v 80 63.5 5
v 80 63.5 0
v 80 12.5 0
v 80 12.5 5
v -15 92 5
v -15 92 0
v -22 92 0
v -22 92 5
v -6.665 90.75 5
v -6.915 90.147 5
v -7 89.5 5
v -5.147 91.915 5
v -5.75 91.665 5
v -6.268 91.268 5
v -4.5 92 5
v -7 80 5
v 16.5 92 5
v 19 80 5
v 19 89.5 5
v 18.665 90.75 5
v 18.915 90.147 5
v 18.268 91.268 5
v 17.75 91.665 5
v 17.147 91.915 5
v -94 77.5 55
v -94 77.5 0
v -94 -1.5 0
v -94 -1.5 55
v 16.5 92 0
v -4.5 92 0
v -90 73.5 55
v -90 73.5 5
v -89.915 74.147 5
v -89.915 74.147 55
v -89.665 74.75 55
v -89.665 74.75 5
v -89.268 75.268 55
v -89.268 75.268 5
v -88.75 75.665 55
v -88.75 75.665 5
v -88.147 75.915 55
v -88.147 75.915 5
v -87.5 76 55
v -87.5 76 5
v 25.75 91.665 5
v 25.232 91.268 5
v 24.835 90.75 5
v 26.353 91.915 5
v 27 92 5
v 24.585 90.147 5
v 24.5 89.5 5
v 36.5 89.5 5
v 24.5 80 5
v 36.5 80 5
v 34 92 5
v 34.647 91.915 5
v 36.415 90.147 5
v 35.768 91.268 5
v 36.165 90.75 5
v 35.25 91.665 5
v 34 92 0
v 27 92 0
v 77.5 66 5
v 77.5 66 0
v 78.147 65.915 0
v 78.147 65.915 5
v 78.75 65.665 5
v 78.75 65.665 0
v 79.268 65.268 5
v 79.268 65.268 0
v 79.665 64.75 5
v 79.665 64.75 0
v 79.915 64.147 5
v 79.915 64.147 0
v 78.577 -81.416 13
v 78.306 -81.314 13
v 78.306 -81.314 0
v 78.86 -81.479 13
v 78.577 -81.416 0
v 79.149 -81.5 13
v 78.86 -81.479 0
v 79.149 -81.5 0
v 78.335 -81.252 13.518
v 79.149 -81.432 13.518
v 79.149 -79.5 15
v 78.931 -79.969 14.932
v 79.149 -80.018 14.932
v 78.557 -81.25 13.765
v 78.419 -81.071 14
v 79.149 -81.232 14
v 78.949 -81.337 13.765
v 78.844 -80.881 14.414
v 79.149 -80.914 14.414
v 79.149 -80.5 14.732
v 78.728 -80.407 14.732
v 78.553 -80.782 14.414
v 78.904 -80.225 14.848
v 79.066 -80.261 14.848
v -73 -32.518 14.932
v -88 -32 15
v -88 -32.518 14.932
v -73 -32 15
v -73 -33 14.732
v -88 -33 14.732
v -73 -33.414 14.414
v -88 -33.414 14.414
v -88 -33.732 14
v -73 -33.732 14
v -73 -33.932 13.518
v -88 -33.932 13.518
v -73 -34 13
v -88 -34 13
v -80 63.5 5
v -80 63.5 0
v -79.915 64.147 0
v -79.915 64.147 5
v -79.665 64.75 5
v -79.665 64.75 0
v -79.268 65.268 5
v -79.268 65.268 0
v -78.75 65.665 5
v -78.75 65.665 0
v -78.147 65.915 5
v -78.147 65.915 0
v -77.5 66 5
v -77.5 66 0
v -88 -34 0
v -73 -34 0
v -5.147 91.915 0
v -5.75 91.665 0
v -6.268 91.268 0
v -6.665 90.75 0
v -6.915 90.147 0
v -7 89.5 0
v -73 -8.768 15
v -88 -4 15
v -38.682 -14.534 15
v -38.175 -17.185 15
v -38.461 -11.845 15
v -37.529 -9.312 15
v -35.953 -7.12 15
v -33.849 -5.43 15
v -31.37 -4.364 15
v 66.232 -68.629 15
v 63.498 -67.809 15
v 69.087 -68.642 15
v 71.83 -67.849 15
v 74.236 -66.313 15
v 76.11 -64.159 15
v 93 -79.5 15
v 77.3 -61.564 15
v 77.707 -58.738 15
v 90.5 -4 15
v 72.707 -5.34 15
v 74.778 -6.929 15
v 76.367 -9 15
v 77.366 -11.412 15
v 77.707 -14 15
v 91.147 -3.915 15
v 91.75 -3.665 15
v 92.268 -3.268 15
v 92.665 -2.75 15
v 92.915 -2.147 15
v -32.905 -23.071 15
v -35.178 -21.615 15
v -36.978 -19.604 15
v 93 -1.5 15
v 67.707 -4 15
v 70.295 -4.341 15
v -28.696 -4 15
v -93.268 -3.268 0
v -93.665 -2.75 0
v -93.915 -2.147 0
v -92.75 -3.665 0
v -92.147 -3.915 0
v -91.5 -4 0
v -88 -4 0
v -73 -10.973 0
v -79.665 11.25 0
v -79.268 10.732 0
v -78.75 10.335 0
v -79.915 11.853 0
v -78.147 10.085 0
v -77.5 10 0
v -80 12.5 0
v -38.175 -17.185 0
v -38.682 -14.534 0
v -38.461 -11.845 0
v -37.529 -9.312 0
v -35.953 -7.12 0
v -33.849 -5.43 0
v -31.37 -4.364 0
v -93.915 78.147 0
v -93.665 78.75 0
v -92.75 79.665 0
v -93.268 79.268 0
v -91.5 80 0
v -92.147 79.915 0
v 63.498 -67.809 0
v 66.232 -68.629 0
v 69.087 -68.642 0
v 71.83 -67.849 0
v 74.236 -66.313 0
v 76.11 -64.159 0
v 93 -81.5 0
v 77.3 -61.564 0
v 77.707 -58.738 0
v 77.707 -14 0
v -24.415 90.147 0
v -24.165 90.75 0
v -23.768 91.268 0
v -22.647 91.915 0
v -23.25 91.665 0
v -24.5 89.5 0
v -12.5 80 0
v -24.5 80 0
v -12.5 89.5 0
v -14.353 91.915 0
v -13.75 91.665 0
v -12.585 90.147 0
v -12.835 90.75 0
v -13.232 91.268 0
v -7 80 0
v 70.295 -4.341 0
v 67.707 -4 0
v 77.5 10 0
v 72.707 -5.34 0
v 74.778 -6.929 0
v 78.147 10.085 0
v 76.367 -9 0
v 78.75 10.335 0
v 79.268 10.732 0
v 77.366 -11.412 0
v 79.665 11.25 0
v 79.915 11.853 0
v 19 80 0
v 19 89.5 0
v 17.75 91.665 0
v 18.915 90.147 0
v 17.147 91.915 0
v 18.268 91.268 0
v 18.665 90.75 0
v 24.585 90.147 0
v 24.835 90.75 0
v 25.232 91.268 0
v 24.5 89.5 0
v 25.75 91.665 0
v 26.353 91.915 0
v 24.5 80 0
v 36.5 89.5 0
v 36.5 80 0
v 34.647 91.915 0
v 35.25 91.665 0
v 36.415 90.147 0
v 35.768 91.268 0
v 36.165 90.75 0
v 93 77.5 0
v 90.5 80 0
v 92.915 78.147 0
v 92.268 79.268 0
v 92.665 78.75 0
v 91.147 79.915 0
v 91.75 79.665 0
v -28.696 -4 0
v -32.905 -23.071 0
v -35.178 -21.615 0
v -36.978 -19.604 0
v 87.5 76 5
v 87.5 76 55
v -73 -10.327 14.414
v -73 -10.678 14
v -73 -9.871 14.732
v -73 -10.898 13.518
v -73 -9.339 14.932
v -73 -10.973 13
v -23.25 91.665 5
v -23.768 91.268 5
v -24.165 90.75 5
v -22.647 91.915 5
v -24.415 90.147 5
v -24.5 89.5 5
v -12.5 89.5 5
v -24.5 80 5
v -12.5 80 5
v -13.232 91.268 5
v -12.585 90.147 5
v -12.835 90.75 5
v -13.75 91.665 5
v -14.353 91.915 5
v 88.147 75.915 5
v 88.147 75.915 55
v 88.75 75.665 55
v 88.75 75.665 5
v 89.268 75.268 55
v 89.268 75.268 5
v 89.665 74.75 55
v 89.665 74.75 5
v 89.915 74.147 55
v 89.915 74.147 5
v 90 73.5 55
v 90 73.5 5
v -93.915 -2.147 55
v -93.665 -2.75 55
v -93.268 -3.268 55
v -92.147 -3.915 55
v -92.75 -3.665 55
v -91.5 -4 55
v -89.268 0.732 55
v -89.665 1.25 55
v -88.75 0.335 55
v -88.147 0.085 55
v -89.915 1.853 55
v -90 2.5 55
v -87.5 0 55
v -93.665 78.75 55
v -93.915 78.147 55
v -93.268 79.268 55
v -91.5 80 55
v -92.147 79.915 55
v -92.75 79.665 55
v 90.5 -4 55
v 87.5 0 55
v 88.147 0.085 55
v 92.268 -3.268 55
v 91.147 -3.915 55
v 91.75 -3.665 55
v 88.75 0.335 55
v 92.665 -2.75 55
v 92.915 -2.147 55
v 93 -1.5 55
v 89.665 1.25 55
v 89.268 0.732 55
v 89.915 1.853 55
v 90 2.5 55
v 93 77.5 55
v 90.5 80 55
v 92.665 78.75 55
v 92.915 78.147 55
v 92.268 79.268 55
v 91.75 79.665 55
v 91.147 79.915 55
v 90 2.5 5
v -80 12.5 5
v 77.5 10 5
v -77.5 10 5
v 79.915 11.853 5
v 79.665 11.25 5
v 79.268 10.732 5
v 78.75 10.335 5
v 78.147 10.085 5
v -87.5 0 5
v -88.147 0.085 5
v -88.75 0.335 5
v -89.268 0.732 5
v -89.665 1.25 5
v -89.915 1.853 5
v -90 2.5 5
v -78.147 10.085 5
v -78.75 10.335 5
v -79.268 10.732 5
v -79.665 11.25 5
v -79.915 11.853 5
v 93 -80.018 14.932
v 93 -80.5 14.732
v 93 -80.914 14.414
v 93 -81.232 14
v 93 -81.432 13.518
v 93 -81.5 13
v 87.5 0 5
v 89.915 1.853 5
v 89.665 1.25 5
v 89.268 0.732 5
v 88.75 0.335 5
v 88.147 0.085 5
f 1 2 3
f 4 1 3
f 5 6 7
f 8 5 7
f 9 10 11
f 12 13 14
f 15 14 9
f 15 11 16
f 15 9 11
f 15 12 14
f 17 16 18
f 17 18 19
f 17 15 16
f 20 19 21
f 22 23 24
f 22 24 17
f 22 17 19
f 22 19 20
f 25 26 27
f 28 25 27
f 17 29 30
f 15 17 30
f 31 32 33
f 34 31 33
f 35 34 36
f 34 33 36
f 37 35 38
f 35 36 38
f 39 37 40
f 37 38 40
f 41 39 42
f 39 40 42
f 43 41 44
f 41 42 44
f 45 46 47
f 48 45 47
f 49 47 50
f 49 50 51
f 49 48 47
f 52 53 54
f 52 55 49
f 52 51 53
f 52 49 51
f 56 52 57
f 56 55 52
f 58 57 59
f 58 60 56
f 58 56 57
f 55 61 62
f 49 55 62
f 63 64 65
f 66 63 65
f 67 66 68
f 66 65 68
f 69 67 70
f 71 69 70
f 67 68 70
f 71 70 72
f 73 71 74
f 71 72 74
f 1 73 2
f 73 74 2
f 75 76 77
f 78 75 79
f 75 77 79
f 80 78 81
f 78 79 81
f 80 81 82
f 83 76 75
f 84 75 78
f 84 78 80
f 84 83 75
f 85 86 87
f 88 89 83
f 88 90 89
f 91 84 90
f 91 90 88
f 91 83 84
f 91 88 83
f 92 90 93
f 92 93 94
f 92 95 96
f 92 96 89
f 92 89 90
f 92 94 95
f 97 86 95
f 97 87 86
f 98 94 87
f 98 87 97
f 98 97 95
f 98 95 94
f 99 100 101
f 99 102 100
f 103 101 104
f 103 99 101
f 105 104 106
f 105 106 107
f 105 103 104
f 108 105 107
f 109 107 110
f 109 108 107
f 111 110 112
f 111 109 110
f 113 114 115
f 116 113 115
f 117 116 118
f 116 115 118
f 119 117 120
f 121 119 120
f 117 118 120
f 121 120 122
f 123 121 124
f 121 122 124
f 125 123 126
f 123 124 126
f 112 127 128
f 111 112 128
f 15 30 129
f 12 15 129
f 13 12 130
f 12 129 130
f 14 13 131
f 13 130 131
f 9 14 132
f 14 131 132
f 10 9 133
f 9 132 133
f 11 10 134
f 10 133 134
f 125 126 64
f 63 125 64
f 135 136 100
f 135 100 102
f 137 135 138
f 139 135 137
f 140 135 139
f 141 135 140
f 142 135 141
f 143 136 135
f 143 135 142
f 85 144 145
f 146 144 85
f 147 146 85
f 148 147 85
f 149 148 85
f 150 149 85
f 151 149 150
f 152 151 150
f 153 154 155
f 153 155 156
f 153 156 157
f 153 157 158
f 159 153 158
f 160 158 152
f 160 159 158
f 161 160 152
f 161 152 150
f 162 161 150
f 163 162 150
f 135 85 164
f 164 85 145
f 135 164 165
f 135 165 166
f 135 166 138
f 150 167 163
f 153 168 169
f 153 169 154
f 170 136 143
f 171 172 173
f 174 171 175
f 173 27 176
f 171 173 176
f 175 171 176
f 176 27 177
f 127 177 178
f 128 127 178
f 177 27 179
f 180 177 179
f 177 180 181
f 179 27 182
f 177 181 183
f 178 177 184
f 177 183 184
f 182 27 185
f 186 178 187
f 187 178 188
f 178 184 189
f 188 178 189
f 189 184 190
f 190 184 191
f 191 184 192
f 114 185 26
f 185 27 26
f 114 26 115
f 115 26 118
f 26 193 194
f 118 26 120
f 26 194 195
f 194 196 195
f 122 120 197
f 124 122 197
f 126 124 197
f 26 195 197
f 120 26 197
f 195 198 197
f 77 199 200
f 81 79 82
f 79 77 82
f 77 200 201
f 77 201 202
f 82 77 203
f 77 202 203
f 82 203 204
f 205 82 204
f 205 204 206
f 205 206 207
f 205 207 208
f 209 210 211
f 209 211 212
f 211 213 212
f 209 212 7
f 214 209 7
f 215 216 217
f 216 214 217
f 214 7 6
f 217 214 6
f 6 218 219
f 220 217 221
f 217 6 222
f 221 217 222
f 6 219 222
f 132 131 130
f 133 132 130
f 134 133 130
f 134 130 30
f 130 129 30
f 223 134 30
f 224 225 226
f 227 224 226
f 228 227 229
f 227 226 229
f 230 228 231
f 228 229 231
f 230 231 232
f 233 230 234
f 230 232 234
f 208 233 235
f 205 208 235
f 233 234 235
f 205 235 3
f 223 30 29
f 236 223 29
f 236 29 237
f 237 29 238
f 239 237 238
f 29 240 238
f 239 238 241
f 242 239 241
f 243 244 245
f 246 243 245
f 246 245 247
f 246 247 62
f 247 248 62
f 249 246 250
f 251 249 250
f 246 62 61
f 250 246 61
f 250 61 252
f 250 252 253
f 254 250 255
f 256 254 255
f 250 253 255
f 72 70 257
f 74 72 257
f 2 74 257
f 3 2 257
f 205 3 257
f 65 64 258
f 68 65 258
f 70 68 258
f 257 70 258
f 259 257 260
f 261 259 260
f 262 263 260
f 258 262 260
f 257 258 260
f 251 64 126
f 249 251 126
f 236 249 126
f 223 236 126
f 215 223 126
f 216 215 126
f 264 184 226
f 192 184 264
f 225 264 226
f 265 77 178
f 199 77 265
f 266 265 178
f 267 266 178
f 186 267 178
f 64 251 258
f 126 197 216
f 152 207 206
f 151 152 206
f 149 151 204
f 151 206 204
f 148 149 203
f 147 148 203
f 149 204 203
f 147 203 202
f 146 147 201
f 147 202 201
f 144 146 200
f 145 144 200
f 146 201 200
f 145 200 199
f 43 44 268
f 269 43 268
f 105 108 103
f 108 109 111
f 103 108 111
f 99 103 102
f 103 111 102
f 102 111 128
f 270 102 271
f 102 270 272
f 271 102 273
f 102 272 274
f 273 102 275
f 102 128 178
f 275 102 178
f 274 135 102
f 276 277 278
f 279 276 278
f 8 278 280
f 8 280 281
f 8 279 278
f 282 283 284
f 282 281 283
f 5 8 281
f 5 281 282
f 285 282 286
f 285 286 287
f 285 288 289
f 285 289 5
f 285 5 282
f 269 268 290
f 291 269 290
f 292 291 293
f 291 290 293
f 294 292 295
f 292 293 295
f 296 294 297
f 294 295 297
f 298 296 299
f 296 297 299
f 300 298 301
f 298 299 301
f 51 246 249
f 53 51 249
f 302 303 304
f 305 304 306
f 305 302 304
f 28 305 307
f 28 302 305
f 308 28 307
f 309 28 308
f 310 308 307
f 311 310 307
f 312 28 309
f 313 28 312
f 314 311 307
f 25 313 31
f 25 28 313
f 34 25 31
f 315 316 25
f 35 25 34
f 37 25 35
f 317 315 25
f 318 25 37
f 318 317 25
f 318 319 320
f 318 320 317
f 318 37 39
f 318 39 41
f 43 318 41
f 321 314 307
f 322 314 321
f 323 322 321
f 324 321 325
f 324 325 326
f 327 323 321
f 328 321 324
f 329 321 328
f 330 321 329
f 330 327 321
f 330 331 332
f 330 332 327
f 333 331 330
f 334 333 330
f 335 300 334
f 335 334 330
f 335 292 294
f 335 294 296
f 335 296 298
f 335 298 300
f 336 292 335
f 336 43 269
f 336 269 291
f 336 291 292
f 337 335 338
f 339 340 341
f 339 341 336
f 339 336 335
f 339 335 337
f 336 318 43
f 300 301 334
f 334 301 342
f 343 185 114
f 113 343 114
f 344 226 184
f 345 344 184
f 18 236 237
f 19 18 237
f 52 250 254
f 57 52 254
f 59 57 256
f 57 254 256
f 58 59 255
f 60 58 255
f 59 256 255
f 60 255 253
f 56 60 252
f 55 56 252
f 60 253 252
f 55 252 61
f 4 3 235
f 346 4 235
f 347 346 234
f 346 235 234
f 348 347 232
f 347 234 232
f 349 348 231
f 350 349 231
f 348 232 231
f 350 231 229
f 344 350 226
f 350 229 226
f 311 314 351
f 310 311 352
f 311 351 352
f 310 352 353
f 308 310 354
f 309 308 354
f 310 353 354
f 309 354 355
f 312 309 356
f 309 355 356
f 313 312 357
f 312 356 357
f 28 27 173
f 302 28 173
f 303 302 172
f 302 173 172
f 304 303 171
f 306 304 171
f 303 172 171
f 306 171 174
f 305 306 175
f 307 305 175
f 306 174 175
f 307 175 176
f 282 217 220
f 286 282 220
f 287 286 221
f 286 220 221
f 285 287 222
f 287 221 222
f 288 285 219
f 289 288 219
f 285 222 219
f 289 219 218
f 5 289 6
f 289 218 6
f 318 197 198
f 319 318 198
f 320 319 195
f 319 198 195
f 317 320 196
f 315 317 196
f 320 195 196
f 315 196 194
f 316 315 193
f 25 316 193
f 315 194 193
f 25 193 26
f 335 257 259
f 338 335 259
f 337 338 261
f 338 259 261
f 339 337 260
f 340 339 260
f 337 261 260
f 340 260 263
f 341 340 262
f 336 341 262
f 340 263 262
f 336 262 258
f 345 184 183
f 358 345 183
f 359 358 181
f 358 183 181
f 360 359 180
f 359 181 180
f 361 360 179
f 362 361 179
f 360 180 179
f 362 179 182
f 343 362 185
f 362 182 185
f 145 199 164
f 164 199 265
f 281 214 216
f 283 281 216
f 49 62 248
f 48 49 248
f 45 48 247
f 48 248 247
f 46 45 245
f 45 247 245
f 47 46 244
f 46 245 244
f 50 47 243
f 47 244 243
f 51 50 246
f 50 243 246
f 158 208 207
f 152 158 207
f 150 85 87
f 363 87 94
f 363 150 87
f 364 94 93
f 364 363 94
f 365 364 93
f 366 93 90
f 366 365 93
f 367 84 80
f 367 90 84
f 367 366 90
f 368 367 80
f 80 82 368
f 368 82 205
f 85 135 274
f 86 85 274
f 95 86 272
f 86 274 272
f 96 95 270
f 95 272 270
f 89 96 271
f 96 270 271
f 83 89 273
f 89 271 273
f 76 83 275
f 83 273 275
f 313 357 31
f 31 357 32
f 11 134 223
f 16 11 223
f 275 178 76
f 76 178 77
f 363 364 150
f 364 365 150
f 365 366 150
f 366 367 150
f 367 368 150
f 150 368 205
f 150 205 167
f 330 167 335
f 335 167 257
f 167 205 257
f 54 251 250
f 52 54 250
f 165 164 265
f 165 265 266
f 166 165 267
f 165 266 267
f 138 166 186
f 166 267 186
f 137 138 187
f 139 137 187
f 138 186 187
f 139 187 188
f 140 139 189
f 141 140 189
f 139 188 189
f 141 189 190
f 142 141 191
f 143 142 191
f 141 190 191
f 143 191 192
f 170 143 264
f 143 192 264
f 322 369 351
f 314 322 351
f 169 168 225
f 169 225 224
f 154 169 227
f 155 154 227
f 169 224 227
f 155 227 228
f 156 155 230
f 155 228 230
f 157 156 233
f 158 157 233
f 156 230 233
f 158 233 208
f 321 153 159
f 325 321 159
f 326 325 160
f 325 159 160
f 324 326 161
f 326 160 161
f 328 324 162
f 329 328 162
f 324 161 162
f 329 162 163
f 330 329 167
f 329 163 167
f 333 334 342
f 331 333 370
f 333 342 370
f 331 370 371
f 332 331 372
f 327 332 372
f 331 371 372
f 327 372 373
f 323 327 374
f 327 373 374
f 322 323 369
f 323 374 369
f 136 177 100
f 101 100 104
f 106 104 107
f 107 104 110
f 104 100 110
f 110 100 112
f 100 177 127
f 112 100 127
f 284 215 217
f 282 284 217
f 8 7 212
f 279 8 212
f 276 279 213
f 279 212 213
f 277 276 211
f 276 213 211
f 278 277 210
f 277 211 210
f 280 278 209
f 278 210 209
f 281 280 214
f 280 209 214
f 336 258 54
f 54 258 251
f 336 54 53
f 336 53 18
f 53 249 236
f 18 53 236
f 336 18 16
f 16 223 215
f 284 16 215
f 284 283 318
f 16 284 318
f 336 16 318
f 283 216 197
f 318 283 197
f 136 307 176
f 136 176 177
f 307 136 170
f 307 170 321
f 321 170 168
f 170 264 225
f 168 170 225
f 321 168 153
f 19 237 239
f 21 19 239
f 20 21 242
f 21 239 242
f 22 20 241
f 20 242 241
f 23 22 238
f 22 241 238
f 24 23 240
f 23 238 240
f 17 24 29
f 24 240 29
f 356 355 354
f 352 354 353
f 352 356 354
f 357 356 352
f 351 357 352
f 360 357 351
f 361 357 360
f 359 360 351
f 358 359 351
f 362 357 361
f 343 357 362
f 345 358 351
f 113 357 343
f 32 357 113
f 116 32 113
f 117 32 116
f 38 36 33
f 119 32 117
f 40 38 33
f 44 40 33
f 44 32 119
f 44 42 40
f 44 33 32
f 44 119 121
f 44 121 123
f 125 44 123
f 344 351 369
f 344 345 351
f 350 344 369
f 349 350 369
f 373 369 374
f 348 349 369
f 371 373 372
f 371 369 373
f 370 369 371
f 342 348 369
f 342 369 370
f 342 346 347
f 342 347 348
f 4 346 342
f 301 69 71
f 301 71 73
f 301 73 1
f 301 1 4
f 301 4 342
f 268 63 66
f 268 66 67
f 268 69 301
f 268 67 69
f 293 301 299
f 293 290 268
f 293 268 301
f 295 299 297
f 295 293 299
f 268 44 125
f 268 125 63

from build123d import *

# Parameters (mm, degrees)
F1_DEPTH     = 55
F2_DEPTH     = 5
F3_DEPTH     = 15
F4_DEPTH     = 15
F5_R         = 2
F6_T1_DEPTH  = 14.1054111362
F6_T6_DEPTH  = 2
F6_T12_DEPTH = 171.8572508491
F7_R         = 2


# Not quite as in the source:
# - a fillet or chamfer that OpenCascade refuses, or shapes differently, is made with other operations: its cross-section is extruded or revolved along the edge and cut away or added
# - a feature names something its author has since deleted; it is built from what else it names


with BuildPart() as f1:
    # F0 (on Top) → F1 (new body)
    with BuildSketch(Plane.XY):
        with BuildLine():
            ThreePointArc((93, 77.5), (92.267766953, 79.267766953), (90.5, 80))
            Line((90.5, 80), (36.5, 80))
            Line((36.5, 80), (24.5, 80))
            Line((24.5, 80), (19, 80))
            Line((19, 80), (-7, 80))
            Line((-7, 80), (-12.5, 80))
            Line((-12.5, 80), (-24.5, 80))
            Line((-24.5, 80), (-74, 80))
            Line((-74, 80), (-91.5, 80))
            ThreePointArc((-91.5, 80), (-93.267766953, 79.267766953), (-94, 77.5))
            Line((-94, 77.5), (-94, 76))
            Line((-94, 76), (-94, 0))
            Line((-94, 0), (-94, -1.5))
            ThreePointArc((-94, -1.5), (-93.267766953, -3.267766953), (-91.5, -4))
            Line((-91.5, -4), (-88, -4))
            Line((-88, -4), (-73, -4))
            Line((-73, -4), (-28.6959191337, -4))
            Line((-28.6959191337, -4), (67.7072161436, -4))
            Line((67.7072161436, -4), (88, -4))
            Line((88, -4), (90.5, -4))
            ThreePointArc((90.5, -4), (92.267766953, -3.267766953), (93, -1.5))
            Line((93, -1.5), (93, 0))
            Line((93, 0), (93, 76))
            Line((93, 76), (93, 77.5))
        make_face()
        with BuildLine():
            ThreePointArc((90, 2.5), (89.267766953, 0.732233047), (87.5, 0))
            Line((87.5, 0), (-87.5, 0))
            ThreePointArc((-87.5, 0), (-89.267766953, 0.732233047), (-90, 2.5))
            Line((-90, 2.5), (-90, 73.5))
            ThreePointArc((-90, 73.5), (-89.267766953, 75.267766953), (-87.5, 76))
            Line((-87.5, 76), (87.5, 76))
            ThreePointArc((87.5, 76), (89.267766953, 75.267766953), (90, 73.5))
            Line((90, 73.5), (90, 2.5))
        make_face(mode=Mode.SUBTRACT)
    extrude(amount=F1_DEPTH)

    # F0 (on Top) → F2 (join)
    with BuildSketch(Plane.XY):
        with BuildLine():
            Line((-87.5, 0), (87.5, 0))
            ThreePointArc((87.5, 0), (89.267766953, 0.732233047), (90, 2.5))
            Line((90, 2.5), (90, 73.5))
            ThreePointArc((90, 73.5), (89.267766953, 75.267766953), (87.5, 76))
            Line((87.5, 76), (-87.5, 76))
            ThreePointArc((-87.5, 76), (-89.267766953, 75.267766953), (-90, 73.5))
            Line((-90, 73.5), (-90, 2.5))
            ThreePointArc((-90, 2.5), (-89.267766953, 0.732233047), (-87.5, 0))
        make_face()
        with BuildLine():
            Line((-77.5, 66), (77.5, 66))
            ThreePointArc((77.5, 66), (79.267766953, 65.267766953), (80, 63.5))
            Line((80, 63.5), (80, 12.5))
            ThreePointArc((80, 12.5), (79.267766953, 10.732233047), (77.5, 10))
            Line((77.5, 10), (-77.5, 10))
            ThreePointArc((-77.5, 10), (-79.267766953, 10.732233047), (-80, 12.5))
            Line((-80, 12.5), (-80, 63.5))
            ThreePointArc((-80, 63.5), (-79.267766953, 65.267766953), (-77.5, 66))
        make_face(mode=Mode.SUBTRACT)
        with BuildLine():
            Line((-24.5, 80), (-12.5, 80))
            Line((-12.5, 80), (-12.5, 89.5))
            ThreePointArc((-12.5, 89.5), (-13.232233047, 91.267766953), (-15, 92))
            Line((-15, 92), (-22, 92))
            ThreePointArc((-22, 92), (-23.767766953, 91.267766953), (-24.5, 89.5))
            Line((-24.5, 89.5), (-24.5, 80))
        make_face()
        with BuildLine():
            Line((-7, 80), (19, 80))
            Line((19, 80), (19, 89.5))
            ThreePointArc((19, 89.5), (18.267766953, 91.267766953), (16.5, 92))
            Line((16.5, 92), (-4.5, 92))
            ThreePointArc((-4.5, 92), (-6.267766953, 91.267766953), (-7, 89.5))
            Line((-7, 89.5), (-7, 80))
        make_face()
        with BuildLine():
            Line((24.5, 80), (36.5, 80))
            Line((36.5, 80), (36.5, 89.5))
            ThreePointArc((36.5, 89.5), (35.767766953, 91.267766953), (34, 92))
            Line((34, 92), (27, 92))
            ThreePointArc((27, 92), (25.232233047, 91.267766953), (24.5, 89.5))
            Line((24.5, 89.5), (24.5, 80))
        make_face()
    extrude(amount=F2_DEPTH)

    # F0 (on Top) → F3 (join)
    with BuildSketch(Plane.XY):
        with BuildLine():
            Line((93, -81.5), (93, -1.5))
            ThreePointArc((93, -1.5), (92.267766953, -3.267766953), (90.5, -4))
            Line((90.5, -4), (88, -4))
            Line((88, -4), (67.7072161436, -4))
            ThreePointArc((67.7072161436, -4), (74.7782839555, -6.9289321881), (77.7072161436, -14))
            Line((77.7072161436, -14), (77.7072161436, -58.7379819401))
            ThreePointArc((77.7072161436, -58.7379819401), (73.0879609173, -67.1669549309), (63.4976990076, -67.8088124137))
            Line((63.4976990076, -67.8088124137), (-32.9054362697, -23.0708304737))
            ThreePointArc((-32.9054362697, -23.0708304737), (-38.4608642113, -11.8445771571), (-28.6959191337, -4))
            Line((-28.6959191337, -4), (-73, -4))
            Line((-73, -4), (-73, -10.9733034172))
            Line((-73, -10.9733034172), (78.7072161436, -81.5))
            Line((78.7072161436, -81.5), (93, -81.5))
        make_face()
    extrude(amount=F3_DEPTH)

    # F0 (on Top) → F4 (join)
    with BuildSketch(Plane.XY):
        Polygon((-88, -4), (-73, -10.9733034172), (-73, -4), align=None)
        Polygon((-73, -34), (-73, -10.9733034172), (-88, -4), (-88, -34), align=None)
    extrude(amount=F4_DEPTH)

    # F5
    f5_edges = [f1.edges().sort_by_distance(p)[0] for p in [
        (85.853608, -81.5, 15),
    ]]
    fillet(f5_edges, radius=F5_R)

    # F6: fillet of radius 2 on 1 edges, made by hand

    # F6_s2 → F6_t1 (cut)
    with BuildSketch(Plane.XY.offset(-1.1054111362)):
        with BuildLine():
            ThreePointArc((78.3062611352, -81.3136012713), (78.7176414075, -81.4528444053), (79.1493805981, -81.5))
            Line((79.1493805981, -81.5), (78.7072161436, -81.5))
            Line((78.7072161436, -81.5), (78.3062611352, -81.3136012713))
        make_face()
    extrude(amount=F6_T1_DEPTH, mode=Mode.SUBTRACT)


with BuildPart() as f6_tool4:
    # F6_s5 → F6_t6 (new body)
    with BuildSketch(Plane.XY.offset(13)):
        Polygon((79.1493805981, -79.5), (78.3062611352, -81.3136012713), (78.7072161436, -81.5), (79.1493805981, -81.5), align=None)
    extrude(amount=F6_T6_DEPTH)

    # F6_s7 → F6_t8 (revolve, cut)
    with BuildSketch(Plane(origin=(79.1493805981, -79.5, 13), x_dir=(0.2158695953, 0.9764222027, 0), z_dir=(0.9764222027, -0.2158695953, 0))):
        with BuildLine():
            ThreePointArc((0, -2), (2, 0), (0, 2))
            Line((0, 2), (0, -2))
        make_face()
    revolve(axis=Axis((79.1493805981, -79.5, 13), (0, 0, 1)), mode=Mode.SUBTRACT)


with BuildPart() as f1_1:
    add(f1.part)

    # F6_t3: cut F6_tool4
    add(f6_tool4.part, mode=Mode.SUBTRACT)


with BuildPart() as f6_tool10:
    # F6_s11 → F6_t12 (new body)
    with BuildSketch(Plane(origin=(-60.3662112187, 28.0634604648, 0), x_dir=(0, 0, 1), z_dir=(0.9068006357, -0.4215597314, 0))):
        with BuildLine():
            ThreePointArc((15, 38.724458908), (14.4142135624, 40.1386724704), (13, 40.724458908))
            Line((13, 40.724458908), (15, 40.724458908))
            Line((15, 40.724458908), (15, 38.724458908))
        make_face()
    extrude(amount=F6_T12_DEPTH)

    split(bisect_by=Plane.YZ.offset(-73), keep=Keep.TOP)


with BuildPart() as f1_2:
    add(f1_1.part)

    # F6_t9: cut F6_tool10
    add(f6_tool10.part, mode=Mode.SUBTRACT)

    # F7
    f7_edges = [f1_2.edges().sort_by_distance(p)[0] for p in [
        (-80.5, -34, 15),
    ]]
    fillet(f7_edges, radius=F7_R)


solid = f1_2.part
